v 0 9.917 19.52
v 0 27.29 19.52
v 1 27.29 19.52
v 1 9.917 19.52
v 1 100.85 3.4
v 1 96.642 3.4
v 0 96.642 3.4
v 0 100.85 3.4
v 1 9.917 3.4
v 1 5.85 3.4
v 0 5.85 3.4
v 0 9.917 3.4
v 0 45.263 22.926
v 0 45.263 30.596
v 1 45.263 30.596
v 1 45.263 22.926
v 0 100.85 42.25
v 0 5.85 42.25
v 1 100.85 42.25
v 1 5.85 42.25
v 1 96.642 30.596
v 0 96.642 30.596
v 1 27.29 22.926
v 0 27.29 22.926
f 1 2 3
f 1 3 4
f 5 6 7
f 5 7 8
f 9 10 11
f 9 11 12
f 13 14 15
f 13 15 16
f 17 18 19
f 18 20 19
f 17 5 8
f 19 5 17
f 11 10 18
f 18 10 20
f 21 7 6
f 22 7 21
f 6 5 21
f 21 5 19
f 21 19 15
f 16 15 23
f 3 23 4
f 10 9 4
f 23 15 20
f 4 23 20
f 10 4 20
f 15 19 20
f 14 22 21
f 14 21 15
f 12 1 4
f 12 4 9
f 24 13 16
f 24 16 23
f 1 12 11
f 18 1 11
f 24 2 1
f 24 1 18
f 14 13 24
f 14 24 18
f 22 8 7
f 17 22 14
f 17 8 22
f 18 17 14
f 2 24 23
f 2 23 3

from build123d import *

# Parameters (mm, degrees)
SKETCH_1_W          = 95
SKETCH_1_H          = 38.85
EXTRUDE_1_DEPTH     = 0.5
SKETCH_2_W          = 38.85
SKETCH_2_H          = 95
EXTRUDE_2_DEPTH     = 0.5
CUT_EXTRUDE_1_DEPTH = 110.347085009


with BuildPart() as part:
    # Эскиз1 → Бобышка-Вытянуть1 (new body)
    with BuildSketch(Plane(origin=(0.5, 0, 0), x_dir=(0, -1, 0), z_dir=(-1, 0, 0))):
        with Locations((-53.35, 22.825)):
            Rectangle(SKETCH_1_W, SKETCH_1_H)
    extrude(amount=-EXTRUDE_1_DEPTH)

    # Эскиз2 → Бобышка-Вытянуть2 (add)
    with BuildSketch(Plane.ZY.offset(-0.5)):
        with Locations((22.825, 53.35)):
            Rectangle(SKETCH_2_W, SKETCH_2_H)
    extrude(amount=EXTRUDE_2_DEPTH)

    # Эскиз3 → Вырез-Вытянуть1 (cut, through all)
    with BuildSketch(Plane.ZY):
        Polygon((22.925859733, 27.290305028), (19.520373336, 27.290305028), (19.520373336, 9.916579837), (-2.735278428, 9.916579837), (-2.735278428, 27.290305028), (-2.735278428, 45.262642497), (-2.735278428, 96.642195874), (30.596303396, 96.642195874), (30.596303396, 45.262642497), (22.925859733, 45.262642497), align=None)
    extrude(amount=-CUT_EXTRUDE_1_DEPTH, mode=Mode.SUBTRACT)


solid = part.part
